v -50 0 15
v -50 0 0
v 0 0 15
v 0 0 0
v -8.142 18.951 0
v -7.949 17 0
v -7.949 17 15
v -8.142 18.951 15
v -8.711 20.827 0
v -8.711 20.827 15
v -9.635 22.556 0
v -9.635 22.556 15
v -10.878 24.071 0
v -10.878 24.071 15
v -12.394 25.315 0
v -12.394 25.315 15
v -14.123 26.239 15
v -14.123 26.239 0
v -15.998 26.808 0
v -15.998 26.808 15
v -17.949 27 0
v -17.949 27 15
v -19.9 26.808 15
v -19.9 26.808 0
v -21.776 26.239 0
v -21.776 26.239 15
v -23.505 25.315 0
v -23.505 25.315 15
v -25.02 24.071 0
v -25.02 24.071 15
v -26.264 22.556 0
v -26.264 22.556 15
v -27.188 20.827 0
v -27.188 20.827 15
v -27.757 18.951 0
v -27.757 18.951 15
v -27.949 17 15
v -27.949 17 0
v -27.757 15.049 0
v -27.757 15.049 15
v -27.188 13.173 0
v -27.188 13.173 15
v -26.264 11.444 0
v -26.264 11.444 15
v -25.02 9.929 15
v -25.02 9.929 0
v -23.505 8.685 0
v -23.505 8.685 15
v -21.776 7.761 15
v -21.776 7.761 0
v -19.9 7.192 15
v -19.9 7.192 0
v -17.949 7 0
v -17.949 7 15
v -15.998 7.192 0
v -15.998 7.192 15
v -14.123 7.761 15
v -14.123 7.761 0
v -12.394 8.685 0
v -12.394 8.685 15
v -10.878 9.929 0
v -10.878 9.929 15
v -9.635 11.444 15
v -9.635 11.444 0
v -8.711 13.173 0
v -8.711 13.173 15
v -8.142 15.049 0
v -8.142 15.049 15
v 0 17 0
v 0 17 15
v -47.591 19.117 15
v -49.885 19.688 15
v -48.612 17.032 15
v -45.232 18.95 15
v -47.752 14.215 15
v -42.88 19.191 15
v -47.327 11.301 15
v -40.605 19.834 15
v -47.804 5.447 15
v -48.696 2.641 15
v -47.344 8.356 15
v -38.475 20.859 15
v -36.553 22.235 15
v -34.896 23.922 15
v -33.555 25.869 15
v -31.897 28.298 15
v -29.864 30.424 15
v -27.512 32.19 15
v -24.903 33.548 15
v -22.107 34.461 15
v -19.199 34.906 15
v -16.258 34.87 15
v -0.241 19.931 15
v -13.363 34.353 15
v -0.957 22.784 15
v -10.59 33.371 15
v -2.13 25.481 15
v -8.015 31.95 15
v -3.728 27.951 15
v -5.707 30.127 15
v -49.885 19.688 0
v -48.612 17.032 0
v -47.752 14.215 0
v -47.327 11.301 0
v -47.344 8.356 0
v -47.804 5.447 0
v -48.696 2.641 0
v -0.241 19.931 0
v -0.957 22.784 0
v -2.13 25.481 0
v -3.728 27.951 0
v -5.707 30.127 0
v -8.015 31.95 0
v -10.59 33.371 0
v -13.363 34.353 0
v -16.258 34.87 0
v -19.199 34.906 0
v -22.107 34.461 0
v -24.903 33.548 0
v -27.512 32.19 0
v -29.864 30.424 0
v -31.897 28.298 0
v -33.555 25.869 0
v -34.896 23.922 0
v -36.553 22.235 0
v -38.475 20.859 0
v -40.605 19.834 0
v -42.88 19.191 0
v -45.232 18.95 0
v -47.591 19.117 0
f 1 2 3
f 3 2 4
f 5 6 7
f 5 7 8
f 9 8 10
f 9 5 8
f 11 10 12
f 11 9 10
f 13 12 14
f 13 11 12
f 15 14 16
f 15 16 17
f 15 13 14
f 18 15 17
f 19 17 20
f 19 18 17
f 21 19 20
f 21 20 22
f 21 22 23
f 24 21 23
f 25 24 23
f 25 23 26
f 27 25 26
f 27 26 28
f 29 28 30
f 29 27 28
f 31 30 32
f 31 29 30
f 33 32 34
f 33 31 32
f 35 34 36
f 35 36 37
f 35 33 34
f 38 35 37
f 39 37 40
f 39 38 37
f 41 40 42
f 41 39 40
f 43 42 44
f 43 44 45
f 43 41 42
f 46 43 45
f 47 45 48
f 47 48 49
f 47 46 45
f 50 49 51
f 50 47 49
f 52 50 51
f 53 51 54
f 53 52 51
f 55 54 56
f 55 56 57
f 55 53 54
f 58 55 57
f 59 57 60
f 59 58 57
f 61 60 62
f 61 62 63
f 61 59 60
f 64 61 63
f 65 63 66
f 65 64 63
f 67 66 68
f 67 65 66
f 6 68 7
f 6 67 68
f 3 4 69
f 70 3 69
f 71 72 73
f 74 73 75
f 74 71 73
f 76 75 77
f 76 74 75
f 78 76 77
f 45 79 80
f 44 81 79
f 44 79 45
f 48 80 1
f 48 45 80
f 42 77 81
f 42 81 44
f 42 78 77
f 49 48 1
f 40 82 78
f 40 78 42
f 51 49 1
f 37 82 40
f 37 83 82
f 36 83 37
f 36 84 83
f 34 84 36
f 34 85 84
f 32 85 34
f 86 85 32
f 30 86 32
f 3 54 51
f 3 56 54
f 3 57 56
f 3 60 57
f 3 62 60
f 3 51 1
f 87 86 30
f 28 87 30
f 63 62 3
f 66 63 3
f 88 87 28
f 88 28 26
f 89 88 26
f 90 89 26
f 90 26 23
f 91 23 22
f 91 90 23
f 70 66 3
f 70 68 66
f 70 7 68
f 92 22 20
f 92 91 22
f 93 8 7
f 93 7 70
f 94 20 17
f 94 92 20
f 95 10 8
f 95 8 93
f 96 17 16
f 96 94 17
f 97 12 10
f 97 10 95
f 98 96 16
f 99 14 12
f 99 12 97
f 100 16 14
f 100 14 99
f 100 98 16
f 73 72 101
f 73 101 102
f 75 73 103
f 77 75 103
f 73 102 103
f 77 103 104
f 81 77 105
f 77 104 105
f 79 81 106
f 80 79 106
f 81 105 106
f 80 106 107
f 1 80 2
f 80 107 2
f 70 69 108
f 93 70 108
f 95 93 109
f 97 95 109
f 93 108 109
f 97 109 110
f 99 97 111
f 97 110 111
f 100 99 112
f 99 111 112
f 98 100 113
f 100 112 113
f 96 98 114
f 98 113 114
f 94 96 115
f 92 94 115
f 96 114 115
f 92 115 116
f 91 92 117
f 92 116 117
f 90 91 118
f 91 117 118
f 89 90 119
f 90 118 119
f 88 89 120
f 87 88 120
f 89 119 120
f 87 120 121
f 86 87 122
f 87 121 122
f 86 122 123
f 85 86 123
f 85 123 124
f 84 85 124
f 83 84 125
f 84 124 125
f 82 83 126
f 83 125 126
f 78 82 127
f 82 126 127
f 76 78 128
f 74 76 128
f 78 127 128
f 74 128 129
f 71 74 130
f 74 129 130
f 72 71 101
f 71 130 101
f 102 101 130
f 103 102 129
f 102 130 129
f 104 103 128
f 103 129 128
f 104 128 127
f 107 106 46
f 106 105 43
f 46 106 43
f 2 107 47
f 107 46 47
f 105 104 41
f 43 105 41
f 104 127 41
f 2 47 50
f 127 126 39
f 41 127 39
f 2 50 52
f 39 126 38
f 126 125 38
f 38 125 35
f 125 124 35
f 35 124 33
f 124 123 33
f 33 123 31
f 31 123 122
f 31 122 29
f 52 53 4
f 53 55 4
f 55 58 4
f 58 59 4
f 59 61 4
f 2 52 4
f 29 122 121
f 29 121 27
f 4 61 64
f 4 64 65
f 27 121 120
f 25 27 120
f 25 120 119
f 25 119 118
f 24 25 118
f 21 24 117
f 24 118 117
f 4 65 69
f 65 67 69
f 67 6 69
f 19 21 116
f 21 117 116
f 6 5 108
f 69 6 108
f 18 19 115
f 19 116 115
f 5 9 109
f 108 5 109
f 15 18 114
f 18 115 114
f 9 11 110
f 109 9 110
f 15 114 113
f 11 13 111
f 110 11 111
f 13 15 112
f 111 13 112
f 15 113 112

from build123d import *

# Parameters (mm, degrees)
F0_R     = 10
F1_DEPTH = 15


with BuildPart() as f1:
    # F0 (on Top) → F1 (new body)
    with BuildSketch(Plane.XY):
        with BuildLine():
            Line((-50, 0), (0, 0))
            Line((0, 0), (0, 17))
            ThreePointArc((0, 17), (-13.362749, 34.353466), (-33.554691, 25.868697))
            ThreePointArc((-33.554691, 25.868697), (-40.605343, 19.833852), (-49.884871, 19.6875))
            ThreePointArc((-49.884871, 19.6875), (-47.279619, 9.828178), (-50, 0))
        make_face()
        with Locations((-17.949369, 17)):
            Circle(F0_R, mode=Mode.SUBTRACT)
    extrude(amount=F1_DEPTH)


solid = f1.part
